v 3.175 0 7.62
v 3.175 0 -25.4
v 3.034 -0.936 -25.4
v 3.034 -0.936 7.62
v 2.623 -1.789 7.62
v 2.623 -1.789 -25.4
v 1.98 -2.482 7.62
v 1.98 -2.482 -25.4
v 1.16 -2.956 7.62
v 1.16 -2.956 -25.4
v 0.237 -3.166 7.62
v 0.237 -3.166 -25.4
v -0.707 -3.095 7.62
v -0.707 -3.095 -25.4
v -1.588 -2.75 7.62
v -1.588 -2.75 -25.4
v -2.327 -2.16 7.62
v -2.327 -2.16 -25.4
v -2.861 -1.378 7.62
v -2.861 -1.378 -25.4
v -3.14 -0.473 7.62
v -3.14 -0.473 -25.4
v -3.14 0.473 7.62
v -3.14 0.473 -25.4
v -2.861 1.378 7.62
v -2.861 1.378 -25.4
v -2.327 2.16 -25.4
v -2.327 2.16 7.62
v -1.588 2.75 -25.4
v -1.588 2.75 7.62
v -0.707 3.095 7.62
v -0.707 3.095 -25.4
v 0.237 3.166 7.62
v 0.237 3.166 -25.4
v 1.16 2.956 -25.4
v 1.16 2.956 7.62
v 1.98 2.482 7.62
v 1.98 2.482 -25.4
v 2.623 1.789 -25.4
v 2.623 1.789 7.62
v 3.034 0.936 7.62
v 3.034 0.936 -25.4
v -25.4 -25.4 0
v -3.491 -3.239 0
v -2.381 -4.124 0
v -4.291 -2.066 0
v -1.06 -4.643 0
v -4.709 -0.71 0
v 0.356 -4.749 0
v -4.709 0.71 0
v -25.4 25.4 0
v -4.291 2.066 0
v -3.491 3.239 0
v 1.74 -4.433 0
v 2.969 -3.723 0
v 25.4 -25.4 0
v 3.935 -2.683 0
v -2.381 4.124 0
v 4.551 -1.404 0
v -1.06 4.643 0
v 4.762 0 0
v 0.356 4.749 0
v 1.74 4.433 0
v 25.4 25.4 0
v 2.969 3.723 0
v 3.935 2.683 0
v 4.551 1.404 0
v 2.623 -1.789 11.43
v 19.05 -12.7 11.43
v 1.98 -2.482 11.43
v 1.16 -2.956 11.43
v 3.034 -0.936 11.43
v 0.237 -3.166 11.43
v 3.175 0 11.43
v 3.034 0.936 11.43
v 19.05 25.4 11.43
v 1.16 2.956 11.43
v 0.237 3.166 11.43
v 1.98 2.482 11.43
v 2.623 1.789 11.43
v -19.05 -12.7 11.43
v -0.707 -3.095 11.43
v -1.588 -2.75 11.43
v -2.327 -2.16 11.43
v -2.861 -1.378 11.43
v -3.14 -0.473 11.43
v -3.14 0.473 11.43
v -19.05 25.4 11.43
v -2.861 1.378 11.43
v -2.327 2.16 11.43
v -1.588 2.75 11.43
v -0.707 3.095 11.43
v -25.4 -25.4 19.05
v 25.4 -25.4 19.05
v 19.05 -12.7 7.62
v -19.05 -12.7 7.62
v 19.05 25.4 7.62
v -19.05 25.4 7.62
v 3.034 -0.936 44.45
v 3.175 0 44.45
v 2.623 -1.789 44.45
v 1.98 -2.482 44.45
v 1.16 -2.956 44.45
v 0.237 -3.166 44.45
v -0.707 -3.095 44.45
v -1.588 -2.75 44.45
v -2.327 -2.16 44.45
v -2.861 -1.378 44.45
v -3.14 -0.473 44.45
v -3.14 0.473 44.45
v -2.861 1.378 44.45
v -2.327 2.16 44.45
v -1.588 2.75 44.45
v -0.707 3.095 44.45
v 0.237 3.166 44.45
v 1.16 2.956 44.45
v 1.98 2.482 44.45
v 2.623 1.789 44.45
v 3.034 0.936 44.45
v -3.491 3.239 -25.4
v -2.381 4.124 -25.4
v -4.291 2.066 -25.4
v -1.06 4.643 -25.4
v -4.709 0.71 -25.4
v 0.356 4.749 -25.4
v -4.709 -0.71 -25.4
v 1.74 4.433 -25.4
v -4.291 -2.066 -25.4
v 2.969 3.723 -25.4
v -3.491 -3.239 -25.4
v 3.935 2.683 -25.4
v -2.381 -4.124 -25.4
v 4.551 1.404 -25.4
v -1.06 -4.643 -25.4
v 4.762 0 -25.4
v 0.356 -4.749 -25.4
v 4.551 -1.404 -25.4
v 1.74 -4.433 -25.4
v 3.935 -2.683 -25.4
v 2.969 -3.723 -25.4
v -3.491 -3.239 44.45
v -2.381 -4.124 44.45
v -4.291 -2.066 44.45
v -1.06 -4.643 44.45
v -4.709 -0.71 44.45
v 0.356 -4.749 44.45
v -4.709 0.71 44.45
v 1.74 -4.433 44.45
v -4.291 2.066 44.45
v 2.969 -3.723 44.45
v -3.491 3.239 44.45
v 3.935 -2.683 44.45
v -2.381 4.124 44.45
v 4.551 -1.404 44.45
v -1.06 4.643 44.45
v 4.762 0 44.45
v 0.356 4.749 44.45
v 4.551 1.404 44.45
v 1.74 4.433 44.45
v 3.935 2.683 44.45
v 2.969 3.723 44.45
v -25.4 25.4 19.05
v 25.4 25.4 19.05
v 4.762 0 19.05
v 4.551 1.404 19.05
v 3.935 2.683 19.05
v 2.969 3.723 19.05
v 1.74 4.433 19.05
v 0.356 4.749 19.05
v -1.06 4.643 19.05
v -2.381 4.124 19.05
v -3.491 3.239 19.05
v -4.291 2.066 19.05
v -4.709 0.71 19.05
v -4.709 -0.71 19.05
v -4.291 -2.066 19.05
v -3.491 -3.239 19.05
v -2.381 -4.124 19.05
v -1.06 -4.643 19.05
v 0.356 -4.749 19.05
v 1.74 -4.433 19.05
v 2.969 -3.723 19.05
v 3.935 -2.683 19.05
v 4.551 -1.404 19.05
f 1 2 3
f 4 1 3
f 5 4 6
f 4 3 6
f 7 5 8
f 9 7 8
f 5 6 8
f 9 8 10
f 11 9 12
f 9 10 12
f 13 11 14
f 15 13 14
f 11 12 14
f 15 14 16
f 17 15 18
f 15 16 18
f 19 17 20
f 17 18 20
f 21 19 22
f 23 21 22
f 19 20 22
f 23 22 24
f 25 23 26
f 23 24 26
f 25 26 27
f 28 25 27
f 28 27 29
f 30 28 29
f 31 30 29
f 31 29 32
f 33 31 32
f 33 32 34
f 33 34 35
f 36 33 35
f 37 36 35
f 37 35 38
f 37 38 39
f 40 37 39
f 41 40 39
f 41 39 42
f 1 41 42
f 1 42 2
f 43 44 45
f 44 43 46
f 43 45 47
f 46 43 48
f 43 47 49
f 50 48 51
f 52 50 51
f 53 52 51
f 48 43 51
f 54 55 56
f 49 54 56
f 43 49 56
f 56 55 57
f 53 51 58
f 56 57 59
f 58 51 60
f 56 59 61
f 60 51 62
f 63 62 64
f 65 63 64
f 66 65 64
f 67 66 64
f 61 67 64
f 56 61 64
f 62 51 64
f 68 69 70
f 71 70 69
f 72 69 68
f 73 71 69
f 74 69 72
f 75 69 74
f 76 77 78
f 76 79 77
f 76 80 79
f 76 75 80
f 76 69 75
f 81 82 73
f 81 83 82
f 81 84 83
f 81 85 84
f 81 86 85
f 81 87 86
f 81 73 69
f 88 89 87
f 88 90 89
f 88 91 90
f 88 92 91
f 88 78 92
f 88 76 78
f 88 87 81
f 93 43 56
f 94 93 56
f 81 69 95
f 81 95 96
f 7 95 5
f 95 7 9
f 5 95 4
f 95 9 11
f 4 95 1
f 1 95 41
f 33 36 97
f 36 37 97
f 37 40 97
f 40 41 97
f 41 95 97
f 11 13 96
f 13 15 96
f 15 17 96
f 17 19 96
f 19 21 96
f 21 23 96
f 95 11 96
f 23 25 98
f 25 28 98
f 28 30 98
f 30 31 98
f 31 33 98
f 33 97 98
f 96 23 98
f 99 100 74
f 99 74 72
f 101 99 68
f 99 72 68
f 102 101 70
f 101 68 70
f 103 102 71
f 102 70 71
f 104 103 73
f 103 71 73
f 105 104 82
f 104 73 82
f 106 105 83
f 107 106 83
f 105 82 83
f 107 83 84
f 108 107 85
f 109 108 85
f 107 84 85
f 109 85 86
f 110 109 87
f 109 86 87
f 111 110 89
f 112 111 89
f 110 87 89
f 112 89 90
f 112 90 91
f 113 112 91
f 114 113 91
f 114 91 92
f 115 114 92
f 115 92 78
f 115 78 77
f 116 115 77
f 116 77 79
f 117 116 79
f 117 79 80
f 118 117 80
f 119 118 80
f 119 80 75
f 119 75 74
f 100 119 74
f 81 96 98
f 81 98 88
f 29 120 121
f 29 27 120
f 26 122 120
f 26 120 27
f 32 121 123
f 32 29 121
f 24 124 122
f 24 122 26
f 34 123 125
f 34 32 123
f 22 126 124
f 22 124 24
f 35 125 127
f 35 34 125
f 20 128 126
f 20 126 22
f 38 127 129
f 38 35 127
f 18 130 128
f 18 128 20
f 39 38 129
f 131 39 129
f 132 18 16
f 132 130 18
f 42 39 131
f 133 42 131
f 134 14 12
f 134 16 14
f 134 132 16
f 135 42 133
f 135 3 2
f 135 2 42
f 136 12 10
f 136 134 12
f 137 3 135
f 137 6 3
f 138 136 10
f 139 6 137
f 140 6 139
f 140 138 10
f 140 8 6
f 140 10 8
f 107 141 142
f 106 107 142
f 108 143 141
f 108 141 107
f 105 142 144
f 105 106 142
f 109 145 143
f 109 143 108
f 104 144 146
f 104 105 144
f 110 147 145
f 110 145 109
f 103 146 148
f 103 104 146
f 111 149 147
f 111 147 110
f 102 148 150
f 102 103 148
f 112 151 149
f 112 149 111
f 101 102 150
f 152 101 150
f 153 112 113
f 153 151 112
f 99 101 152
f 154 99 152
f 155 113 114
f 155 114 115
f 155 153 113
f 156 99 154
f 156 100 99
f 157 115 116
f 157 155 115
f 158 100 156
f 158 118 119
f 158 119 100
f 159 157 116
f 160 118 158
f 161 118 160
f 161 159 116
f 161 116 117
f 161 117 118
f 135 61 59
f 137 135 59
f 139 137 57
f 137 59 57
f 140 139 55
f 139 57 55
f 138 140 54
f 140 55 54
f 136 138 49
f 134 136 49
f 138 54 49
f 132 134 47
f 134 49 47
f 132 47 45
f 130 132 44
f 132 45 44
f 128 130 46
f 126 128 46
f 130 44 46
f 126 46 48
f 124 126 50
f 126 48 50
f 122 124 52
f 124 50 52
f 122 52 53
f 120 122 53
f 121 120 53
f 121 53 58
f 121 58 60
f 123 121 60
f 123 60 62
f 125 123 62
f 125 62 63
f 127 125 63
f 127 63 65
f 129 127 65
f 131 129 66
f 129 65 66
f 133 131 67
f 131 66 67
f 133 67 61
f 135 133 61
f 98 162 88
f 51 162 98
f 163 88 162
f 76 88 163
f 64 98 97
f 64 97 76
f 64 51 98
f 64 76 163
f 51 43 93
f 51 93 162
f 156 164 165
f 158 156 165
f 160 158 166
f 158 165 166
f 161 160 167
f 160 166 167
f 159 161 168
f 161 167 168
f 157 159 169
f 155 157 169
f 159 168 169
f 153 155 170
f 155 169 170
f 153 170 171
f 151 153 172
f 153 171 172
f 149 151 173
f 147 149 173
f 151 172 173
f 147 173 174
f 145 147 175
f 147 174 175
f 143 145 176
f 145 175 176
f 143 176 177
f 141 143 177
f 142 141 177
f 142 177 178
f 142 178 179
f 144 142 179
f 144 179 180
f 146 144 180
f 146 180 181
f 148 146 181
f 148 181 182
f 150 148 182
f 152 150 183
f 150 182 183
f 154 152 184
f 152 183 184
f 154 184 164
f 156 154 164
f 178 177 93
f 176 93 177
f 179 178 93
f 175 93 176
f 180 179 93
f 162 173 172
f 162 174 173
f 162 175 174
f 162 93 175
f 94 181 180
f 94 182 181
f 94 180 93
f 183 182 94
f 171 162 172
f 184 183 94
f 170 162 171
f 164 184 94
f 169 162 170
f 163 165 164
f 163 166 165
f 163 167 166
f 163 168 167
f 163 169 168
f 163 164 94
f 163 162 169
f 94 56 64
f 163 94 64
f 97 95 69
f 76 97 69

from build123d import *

# Parameters (mm, degrees)
F0_W      = 50.8
F0_H      = 50.8
F1_DEPTH  = 19.05
F2_W      = 38.1
F2_H      = 3.81
F3_DEPTH  = 38.1
F5_R      = 4.7625
F6_DEPTH  = 25.4
F7_R      = 4.7625
F8_DEPTH  = 25.4
F9_R      = 3.175
F10_DEPTH = 74.676


with BuildPart() as f1:
    # F0 (on Top) → F1 (new body)
    with BuildSketch(Plane.XY):
        Rectangle(F0_W, F0_H)
    extrude(amount=F1_DEPTH)

    # F2 (on face) → F3 (cut)
    with BuildSketch(Plane(origin=(0, 25.4, 0), x_dir=(-1, 0, 0), z_dir=(0, 1, 0))):
        with Locations((0, 9.525)):
            Rectangle(F2_W, F2_H)
    extrude(amount=-F3_DEPTH, mode=Mode.SUBTRACT)

    # F5 (on face) → F6 (join)
    with BuildSketch(Plane.XY.offset(19.05)):
        Circle(F5_R)
    extrude(amount=F6_DEPTH)

    # F7 (on face) → F8 (join)
    with BuildSketch(Plane(origin=(0, 0, 0), x_dir=(1, 0, 0), z_dir=(0, 0, -1))):
        Circle(F7_R)
    extrude(amount=F8_DEPTH)

    # F9 (on face) → F10 (cut)
    with BuildSketch(Plane(origin=(0, 0, -25.4), x_dir=(1, 0, 0), z_dir=(0, 0, -1))):
        Circle(F9_R)
    extrude(amount=-F10_DEPTH, mode=Mode.SUBTRACT)


solid = f1.part
